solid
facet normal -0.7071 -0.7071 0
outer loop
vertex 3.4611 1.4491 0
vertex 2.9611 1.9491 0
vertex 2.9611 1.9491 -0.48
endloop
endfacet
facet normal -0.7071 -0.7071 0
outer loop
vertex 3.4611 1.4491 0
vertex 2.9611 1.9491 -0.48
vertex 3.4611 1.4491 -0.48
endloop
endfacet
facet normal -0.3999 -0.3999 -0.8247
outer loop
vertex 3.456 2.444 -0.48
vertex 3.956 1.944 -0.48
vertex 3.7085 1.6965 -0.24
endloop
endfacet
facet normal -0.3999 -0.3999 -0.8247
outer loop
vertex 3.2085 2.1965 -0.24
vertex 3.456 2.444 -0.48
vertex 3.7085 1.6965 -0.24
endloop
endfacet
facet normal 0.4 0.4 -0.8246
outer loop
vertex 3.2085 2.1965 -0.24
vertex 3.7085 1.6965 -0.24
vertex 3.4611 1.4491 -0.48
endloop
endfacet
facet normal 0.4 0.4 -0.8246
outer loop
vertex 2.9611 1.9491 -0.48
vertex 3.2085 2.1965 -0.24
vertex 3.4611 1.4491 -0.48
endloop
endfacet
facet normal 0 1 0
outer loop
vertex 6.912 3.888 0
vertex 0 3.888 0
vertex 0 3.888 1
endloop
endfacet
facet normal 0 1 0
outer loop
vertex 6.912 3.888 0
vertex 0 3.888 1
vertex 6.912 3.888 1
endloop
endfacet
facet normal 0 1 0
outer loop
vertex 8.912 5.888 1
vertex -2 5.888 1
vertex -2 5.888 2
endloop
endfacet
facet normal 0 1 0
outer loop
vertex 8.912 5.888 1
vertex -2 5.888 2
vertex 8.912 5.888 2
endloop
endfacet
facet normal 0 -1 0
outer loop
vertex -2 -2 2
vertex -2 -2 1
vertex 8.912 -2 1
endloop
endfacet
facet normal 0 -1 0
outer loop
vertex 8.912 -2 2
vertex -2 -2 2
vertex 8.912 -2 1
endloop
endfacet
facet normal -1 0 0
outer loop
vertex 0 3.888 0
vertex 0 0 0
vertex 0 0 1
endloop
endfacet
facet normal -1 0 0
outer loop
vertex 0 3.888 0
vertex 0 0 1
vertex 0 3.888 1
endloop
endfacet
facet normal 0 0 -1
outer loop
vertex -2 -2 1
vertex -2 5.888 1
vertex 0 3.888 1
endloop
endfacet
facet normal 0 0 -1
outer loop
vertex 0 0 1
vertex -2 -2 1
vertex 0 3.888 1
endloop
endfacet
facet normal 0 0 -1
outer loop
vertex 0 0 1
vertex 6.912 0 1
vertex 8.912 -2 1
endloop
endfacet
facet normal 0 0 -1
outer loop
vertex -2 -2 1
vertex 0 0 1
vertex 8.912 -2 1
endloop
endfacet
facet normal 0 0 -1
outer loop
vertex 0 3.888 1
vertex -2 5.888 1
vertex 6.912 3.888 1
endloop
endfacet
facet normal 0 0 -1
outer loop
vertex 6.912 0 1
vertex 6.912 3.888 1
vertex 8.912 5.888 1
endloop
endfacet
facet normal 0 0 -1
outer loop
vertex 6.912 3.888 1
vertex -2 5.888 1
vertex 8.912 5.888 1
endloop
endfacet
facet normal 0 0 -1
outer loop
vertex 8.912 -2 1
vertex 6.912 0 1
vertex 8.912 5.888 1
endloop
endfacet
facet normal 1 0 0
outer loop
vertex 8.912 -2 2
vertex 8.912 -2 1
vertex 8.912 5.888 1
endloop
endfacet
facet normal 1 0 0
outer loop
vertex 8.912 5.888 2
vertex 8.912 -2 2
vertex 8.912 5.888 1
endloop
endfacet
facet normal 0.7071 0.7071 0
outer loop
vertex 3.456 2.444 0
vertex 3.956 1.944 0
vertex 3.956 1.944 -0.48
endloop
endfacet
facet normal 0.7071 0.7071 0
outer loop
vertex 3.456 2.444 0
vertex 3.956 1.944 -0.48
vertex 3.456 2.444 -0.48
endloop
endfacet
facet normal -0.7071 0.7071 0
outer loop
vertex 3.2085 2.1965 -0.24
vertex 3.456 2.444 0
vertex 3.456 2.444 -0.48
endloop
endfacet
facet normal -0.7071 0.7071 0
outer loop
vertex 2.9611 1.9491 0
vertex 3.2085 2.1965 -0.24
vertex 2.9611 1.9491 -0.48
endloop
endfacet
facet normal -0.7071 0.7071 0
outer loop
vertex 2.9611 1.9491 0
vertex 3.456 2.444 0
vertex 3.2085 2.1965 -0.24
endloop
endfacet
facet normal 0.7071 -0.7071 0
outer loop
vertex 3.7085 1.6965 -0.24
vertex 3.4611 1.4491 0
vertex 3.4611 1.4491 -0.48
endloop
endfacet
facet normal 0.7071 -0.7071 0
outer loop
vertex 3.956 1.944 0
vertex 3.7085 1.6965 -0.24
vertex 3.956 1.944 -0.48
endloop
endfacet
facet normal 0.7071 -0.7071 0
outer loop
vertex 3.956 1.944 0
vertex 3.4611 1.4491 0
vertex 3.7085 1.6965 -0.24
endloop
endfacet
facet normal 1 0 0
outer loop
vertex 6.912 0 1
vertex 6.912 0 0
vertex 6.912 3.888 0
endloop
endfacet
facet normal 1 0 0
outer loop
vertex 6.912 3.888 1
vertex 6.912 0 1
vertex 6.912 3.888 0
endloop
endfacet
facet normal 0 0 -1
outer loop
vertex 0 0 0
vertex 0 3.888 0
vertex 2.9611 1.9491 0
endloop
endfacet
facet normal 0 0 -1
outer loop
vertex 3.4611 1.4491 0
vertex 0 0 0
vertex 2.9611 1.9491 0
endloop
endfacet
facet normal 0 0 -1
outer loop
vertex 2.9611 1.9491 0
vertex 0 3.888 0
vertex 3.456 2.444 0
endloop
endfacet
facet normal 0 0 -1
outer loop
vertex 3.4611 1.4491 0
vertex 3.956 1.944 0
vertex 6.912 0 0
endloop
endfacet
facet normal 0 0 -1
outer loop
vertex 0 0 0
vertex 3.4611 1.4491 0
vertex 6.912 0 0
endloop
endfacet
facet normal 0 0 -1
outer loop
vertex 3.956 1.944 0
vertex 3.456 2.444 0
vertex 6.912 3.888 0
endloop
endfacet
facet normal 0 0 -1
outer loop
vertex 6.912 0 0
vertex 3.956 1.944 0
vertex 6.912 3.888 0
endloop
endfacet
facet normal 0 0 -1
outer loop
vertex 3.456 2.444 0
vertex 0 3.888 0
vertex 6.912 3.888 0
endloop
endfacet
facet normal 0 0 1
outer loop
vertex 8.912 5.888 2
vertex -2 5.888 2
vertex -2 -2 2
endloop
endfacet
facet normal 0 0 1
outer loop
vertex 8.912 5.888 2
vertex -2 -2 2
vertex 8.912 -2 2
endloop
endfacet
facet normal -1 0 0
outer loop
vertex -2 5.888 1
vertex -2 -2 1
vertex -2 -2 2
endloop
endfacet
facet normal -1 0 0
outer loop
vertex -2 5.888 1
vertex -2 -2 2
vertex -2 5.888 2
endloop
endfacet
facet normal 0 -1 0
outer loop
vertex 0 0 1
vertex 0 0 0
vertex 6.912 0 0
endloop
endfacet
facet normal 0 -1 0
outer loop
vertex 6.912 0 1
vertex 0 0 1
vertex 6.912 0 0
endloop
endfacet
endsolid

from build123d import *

# Parameters (mm, degrees)
SKIZZE1_W                       = 6.912
SKIZZE1_H                       = 3.888
AUFSATZ_LINEAR_AUSTRAGEN1_DEPTH = 1
SKIZZE2_W                       = 10.912
SKIZZE2_H                       = 7.888
AUFSATZ_LINEAR_AUSTRAGEN2_DEPTH = 1
AUFSATZ_LINEAR_AUSTRAGEN3_DEPTH = 0.48
SCHNITT_LINEAR_AUSTRAGEN1_DEPTH = 40.48


with BuildPart() as part:
    # Skizze1 → Aufsatz-Linear austragen1 (new body)
    with BuildSketch(Plane.XY):
        with Locations((3.456, 1.944)):
            Rectangle(SKIZZE1_W, SKIZZE1_H)
    extrude(amount=AUFSATZ_LINEAR_AUSTRAGEN1_DEPTH)

    # Skizze2 → Aufsatz-Linear austragen2 (add)
    with BuildSketch(Plane.XY.offset(1)):
        with Locations((3.456, 1.944)):
            Rectangle(SKIZZE2_W, SKIZZE2_H)
    extrude(amount=AUFSATZ_LINEAR_AUSTRAGEN2_DEPTH)

    # Skizze3 → Aufsatz-Linear austragen3 (add)
    with BuildSketch(Plane(origin=(0, 0, 0), x_dir=(-1, 0, 0), z_dir=(0, 0, -1))):
        Polygon((-3.956, 1.944), (-3.456, 2.444), (-2.961061255, 1.949061255), (-3.461061255, 1.449061255), align=None)
    extrude(amount=AUFSATZ_LINEAR_AUSTRAGEN3_DEPTH)

    # Skizze6 → Schnitt-Linear austragen1 (cut)
    with BuildSketch(Plane(origin=(1.006, -1.006, 0), x_dir=(0, 0, -1), z_dir=(0.7071067811865474, -0.7071067811865477, 0))):
        Polygon((0.48, 4.171930009), (0.24, 3.821955466), (0.48, 3.471980924), align=None)
    extrude(amount=-SCHNITT_LINEAR_AUSTRAGEN1_DEPTH, mode=Mode.SUBTRACT)


solid = part.part
